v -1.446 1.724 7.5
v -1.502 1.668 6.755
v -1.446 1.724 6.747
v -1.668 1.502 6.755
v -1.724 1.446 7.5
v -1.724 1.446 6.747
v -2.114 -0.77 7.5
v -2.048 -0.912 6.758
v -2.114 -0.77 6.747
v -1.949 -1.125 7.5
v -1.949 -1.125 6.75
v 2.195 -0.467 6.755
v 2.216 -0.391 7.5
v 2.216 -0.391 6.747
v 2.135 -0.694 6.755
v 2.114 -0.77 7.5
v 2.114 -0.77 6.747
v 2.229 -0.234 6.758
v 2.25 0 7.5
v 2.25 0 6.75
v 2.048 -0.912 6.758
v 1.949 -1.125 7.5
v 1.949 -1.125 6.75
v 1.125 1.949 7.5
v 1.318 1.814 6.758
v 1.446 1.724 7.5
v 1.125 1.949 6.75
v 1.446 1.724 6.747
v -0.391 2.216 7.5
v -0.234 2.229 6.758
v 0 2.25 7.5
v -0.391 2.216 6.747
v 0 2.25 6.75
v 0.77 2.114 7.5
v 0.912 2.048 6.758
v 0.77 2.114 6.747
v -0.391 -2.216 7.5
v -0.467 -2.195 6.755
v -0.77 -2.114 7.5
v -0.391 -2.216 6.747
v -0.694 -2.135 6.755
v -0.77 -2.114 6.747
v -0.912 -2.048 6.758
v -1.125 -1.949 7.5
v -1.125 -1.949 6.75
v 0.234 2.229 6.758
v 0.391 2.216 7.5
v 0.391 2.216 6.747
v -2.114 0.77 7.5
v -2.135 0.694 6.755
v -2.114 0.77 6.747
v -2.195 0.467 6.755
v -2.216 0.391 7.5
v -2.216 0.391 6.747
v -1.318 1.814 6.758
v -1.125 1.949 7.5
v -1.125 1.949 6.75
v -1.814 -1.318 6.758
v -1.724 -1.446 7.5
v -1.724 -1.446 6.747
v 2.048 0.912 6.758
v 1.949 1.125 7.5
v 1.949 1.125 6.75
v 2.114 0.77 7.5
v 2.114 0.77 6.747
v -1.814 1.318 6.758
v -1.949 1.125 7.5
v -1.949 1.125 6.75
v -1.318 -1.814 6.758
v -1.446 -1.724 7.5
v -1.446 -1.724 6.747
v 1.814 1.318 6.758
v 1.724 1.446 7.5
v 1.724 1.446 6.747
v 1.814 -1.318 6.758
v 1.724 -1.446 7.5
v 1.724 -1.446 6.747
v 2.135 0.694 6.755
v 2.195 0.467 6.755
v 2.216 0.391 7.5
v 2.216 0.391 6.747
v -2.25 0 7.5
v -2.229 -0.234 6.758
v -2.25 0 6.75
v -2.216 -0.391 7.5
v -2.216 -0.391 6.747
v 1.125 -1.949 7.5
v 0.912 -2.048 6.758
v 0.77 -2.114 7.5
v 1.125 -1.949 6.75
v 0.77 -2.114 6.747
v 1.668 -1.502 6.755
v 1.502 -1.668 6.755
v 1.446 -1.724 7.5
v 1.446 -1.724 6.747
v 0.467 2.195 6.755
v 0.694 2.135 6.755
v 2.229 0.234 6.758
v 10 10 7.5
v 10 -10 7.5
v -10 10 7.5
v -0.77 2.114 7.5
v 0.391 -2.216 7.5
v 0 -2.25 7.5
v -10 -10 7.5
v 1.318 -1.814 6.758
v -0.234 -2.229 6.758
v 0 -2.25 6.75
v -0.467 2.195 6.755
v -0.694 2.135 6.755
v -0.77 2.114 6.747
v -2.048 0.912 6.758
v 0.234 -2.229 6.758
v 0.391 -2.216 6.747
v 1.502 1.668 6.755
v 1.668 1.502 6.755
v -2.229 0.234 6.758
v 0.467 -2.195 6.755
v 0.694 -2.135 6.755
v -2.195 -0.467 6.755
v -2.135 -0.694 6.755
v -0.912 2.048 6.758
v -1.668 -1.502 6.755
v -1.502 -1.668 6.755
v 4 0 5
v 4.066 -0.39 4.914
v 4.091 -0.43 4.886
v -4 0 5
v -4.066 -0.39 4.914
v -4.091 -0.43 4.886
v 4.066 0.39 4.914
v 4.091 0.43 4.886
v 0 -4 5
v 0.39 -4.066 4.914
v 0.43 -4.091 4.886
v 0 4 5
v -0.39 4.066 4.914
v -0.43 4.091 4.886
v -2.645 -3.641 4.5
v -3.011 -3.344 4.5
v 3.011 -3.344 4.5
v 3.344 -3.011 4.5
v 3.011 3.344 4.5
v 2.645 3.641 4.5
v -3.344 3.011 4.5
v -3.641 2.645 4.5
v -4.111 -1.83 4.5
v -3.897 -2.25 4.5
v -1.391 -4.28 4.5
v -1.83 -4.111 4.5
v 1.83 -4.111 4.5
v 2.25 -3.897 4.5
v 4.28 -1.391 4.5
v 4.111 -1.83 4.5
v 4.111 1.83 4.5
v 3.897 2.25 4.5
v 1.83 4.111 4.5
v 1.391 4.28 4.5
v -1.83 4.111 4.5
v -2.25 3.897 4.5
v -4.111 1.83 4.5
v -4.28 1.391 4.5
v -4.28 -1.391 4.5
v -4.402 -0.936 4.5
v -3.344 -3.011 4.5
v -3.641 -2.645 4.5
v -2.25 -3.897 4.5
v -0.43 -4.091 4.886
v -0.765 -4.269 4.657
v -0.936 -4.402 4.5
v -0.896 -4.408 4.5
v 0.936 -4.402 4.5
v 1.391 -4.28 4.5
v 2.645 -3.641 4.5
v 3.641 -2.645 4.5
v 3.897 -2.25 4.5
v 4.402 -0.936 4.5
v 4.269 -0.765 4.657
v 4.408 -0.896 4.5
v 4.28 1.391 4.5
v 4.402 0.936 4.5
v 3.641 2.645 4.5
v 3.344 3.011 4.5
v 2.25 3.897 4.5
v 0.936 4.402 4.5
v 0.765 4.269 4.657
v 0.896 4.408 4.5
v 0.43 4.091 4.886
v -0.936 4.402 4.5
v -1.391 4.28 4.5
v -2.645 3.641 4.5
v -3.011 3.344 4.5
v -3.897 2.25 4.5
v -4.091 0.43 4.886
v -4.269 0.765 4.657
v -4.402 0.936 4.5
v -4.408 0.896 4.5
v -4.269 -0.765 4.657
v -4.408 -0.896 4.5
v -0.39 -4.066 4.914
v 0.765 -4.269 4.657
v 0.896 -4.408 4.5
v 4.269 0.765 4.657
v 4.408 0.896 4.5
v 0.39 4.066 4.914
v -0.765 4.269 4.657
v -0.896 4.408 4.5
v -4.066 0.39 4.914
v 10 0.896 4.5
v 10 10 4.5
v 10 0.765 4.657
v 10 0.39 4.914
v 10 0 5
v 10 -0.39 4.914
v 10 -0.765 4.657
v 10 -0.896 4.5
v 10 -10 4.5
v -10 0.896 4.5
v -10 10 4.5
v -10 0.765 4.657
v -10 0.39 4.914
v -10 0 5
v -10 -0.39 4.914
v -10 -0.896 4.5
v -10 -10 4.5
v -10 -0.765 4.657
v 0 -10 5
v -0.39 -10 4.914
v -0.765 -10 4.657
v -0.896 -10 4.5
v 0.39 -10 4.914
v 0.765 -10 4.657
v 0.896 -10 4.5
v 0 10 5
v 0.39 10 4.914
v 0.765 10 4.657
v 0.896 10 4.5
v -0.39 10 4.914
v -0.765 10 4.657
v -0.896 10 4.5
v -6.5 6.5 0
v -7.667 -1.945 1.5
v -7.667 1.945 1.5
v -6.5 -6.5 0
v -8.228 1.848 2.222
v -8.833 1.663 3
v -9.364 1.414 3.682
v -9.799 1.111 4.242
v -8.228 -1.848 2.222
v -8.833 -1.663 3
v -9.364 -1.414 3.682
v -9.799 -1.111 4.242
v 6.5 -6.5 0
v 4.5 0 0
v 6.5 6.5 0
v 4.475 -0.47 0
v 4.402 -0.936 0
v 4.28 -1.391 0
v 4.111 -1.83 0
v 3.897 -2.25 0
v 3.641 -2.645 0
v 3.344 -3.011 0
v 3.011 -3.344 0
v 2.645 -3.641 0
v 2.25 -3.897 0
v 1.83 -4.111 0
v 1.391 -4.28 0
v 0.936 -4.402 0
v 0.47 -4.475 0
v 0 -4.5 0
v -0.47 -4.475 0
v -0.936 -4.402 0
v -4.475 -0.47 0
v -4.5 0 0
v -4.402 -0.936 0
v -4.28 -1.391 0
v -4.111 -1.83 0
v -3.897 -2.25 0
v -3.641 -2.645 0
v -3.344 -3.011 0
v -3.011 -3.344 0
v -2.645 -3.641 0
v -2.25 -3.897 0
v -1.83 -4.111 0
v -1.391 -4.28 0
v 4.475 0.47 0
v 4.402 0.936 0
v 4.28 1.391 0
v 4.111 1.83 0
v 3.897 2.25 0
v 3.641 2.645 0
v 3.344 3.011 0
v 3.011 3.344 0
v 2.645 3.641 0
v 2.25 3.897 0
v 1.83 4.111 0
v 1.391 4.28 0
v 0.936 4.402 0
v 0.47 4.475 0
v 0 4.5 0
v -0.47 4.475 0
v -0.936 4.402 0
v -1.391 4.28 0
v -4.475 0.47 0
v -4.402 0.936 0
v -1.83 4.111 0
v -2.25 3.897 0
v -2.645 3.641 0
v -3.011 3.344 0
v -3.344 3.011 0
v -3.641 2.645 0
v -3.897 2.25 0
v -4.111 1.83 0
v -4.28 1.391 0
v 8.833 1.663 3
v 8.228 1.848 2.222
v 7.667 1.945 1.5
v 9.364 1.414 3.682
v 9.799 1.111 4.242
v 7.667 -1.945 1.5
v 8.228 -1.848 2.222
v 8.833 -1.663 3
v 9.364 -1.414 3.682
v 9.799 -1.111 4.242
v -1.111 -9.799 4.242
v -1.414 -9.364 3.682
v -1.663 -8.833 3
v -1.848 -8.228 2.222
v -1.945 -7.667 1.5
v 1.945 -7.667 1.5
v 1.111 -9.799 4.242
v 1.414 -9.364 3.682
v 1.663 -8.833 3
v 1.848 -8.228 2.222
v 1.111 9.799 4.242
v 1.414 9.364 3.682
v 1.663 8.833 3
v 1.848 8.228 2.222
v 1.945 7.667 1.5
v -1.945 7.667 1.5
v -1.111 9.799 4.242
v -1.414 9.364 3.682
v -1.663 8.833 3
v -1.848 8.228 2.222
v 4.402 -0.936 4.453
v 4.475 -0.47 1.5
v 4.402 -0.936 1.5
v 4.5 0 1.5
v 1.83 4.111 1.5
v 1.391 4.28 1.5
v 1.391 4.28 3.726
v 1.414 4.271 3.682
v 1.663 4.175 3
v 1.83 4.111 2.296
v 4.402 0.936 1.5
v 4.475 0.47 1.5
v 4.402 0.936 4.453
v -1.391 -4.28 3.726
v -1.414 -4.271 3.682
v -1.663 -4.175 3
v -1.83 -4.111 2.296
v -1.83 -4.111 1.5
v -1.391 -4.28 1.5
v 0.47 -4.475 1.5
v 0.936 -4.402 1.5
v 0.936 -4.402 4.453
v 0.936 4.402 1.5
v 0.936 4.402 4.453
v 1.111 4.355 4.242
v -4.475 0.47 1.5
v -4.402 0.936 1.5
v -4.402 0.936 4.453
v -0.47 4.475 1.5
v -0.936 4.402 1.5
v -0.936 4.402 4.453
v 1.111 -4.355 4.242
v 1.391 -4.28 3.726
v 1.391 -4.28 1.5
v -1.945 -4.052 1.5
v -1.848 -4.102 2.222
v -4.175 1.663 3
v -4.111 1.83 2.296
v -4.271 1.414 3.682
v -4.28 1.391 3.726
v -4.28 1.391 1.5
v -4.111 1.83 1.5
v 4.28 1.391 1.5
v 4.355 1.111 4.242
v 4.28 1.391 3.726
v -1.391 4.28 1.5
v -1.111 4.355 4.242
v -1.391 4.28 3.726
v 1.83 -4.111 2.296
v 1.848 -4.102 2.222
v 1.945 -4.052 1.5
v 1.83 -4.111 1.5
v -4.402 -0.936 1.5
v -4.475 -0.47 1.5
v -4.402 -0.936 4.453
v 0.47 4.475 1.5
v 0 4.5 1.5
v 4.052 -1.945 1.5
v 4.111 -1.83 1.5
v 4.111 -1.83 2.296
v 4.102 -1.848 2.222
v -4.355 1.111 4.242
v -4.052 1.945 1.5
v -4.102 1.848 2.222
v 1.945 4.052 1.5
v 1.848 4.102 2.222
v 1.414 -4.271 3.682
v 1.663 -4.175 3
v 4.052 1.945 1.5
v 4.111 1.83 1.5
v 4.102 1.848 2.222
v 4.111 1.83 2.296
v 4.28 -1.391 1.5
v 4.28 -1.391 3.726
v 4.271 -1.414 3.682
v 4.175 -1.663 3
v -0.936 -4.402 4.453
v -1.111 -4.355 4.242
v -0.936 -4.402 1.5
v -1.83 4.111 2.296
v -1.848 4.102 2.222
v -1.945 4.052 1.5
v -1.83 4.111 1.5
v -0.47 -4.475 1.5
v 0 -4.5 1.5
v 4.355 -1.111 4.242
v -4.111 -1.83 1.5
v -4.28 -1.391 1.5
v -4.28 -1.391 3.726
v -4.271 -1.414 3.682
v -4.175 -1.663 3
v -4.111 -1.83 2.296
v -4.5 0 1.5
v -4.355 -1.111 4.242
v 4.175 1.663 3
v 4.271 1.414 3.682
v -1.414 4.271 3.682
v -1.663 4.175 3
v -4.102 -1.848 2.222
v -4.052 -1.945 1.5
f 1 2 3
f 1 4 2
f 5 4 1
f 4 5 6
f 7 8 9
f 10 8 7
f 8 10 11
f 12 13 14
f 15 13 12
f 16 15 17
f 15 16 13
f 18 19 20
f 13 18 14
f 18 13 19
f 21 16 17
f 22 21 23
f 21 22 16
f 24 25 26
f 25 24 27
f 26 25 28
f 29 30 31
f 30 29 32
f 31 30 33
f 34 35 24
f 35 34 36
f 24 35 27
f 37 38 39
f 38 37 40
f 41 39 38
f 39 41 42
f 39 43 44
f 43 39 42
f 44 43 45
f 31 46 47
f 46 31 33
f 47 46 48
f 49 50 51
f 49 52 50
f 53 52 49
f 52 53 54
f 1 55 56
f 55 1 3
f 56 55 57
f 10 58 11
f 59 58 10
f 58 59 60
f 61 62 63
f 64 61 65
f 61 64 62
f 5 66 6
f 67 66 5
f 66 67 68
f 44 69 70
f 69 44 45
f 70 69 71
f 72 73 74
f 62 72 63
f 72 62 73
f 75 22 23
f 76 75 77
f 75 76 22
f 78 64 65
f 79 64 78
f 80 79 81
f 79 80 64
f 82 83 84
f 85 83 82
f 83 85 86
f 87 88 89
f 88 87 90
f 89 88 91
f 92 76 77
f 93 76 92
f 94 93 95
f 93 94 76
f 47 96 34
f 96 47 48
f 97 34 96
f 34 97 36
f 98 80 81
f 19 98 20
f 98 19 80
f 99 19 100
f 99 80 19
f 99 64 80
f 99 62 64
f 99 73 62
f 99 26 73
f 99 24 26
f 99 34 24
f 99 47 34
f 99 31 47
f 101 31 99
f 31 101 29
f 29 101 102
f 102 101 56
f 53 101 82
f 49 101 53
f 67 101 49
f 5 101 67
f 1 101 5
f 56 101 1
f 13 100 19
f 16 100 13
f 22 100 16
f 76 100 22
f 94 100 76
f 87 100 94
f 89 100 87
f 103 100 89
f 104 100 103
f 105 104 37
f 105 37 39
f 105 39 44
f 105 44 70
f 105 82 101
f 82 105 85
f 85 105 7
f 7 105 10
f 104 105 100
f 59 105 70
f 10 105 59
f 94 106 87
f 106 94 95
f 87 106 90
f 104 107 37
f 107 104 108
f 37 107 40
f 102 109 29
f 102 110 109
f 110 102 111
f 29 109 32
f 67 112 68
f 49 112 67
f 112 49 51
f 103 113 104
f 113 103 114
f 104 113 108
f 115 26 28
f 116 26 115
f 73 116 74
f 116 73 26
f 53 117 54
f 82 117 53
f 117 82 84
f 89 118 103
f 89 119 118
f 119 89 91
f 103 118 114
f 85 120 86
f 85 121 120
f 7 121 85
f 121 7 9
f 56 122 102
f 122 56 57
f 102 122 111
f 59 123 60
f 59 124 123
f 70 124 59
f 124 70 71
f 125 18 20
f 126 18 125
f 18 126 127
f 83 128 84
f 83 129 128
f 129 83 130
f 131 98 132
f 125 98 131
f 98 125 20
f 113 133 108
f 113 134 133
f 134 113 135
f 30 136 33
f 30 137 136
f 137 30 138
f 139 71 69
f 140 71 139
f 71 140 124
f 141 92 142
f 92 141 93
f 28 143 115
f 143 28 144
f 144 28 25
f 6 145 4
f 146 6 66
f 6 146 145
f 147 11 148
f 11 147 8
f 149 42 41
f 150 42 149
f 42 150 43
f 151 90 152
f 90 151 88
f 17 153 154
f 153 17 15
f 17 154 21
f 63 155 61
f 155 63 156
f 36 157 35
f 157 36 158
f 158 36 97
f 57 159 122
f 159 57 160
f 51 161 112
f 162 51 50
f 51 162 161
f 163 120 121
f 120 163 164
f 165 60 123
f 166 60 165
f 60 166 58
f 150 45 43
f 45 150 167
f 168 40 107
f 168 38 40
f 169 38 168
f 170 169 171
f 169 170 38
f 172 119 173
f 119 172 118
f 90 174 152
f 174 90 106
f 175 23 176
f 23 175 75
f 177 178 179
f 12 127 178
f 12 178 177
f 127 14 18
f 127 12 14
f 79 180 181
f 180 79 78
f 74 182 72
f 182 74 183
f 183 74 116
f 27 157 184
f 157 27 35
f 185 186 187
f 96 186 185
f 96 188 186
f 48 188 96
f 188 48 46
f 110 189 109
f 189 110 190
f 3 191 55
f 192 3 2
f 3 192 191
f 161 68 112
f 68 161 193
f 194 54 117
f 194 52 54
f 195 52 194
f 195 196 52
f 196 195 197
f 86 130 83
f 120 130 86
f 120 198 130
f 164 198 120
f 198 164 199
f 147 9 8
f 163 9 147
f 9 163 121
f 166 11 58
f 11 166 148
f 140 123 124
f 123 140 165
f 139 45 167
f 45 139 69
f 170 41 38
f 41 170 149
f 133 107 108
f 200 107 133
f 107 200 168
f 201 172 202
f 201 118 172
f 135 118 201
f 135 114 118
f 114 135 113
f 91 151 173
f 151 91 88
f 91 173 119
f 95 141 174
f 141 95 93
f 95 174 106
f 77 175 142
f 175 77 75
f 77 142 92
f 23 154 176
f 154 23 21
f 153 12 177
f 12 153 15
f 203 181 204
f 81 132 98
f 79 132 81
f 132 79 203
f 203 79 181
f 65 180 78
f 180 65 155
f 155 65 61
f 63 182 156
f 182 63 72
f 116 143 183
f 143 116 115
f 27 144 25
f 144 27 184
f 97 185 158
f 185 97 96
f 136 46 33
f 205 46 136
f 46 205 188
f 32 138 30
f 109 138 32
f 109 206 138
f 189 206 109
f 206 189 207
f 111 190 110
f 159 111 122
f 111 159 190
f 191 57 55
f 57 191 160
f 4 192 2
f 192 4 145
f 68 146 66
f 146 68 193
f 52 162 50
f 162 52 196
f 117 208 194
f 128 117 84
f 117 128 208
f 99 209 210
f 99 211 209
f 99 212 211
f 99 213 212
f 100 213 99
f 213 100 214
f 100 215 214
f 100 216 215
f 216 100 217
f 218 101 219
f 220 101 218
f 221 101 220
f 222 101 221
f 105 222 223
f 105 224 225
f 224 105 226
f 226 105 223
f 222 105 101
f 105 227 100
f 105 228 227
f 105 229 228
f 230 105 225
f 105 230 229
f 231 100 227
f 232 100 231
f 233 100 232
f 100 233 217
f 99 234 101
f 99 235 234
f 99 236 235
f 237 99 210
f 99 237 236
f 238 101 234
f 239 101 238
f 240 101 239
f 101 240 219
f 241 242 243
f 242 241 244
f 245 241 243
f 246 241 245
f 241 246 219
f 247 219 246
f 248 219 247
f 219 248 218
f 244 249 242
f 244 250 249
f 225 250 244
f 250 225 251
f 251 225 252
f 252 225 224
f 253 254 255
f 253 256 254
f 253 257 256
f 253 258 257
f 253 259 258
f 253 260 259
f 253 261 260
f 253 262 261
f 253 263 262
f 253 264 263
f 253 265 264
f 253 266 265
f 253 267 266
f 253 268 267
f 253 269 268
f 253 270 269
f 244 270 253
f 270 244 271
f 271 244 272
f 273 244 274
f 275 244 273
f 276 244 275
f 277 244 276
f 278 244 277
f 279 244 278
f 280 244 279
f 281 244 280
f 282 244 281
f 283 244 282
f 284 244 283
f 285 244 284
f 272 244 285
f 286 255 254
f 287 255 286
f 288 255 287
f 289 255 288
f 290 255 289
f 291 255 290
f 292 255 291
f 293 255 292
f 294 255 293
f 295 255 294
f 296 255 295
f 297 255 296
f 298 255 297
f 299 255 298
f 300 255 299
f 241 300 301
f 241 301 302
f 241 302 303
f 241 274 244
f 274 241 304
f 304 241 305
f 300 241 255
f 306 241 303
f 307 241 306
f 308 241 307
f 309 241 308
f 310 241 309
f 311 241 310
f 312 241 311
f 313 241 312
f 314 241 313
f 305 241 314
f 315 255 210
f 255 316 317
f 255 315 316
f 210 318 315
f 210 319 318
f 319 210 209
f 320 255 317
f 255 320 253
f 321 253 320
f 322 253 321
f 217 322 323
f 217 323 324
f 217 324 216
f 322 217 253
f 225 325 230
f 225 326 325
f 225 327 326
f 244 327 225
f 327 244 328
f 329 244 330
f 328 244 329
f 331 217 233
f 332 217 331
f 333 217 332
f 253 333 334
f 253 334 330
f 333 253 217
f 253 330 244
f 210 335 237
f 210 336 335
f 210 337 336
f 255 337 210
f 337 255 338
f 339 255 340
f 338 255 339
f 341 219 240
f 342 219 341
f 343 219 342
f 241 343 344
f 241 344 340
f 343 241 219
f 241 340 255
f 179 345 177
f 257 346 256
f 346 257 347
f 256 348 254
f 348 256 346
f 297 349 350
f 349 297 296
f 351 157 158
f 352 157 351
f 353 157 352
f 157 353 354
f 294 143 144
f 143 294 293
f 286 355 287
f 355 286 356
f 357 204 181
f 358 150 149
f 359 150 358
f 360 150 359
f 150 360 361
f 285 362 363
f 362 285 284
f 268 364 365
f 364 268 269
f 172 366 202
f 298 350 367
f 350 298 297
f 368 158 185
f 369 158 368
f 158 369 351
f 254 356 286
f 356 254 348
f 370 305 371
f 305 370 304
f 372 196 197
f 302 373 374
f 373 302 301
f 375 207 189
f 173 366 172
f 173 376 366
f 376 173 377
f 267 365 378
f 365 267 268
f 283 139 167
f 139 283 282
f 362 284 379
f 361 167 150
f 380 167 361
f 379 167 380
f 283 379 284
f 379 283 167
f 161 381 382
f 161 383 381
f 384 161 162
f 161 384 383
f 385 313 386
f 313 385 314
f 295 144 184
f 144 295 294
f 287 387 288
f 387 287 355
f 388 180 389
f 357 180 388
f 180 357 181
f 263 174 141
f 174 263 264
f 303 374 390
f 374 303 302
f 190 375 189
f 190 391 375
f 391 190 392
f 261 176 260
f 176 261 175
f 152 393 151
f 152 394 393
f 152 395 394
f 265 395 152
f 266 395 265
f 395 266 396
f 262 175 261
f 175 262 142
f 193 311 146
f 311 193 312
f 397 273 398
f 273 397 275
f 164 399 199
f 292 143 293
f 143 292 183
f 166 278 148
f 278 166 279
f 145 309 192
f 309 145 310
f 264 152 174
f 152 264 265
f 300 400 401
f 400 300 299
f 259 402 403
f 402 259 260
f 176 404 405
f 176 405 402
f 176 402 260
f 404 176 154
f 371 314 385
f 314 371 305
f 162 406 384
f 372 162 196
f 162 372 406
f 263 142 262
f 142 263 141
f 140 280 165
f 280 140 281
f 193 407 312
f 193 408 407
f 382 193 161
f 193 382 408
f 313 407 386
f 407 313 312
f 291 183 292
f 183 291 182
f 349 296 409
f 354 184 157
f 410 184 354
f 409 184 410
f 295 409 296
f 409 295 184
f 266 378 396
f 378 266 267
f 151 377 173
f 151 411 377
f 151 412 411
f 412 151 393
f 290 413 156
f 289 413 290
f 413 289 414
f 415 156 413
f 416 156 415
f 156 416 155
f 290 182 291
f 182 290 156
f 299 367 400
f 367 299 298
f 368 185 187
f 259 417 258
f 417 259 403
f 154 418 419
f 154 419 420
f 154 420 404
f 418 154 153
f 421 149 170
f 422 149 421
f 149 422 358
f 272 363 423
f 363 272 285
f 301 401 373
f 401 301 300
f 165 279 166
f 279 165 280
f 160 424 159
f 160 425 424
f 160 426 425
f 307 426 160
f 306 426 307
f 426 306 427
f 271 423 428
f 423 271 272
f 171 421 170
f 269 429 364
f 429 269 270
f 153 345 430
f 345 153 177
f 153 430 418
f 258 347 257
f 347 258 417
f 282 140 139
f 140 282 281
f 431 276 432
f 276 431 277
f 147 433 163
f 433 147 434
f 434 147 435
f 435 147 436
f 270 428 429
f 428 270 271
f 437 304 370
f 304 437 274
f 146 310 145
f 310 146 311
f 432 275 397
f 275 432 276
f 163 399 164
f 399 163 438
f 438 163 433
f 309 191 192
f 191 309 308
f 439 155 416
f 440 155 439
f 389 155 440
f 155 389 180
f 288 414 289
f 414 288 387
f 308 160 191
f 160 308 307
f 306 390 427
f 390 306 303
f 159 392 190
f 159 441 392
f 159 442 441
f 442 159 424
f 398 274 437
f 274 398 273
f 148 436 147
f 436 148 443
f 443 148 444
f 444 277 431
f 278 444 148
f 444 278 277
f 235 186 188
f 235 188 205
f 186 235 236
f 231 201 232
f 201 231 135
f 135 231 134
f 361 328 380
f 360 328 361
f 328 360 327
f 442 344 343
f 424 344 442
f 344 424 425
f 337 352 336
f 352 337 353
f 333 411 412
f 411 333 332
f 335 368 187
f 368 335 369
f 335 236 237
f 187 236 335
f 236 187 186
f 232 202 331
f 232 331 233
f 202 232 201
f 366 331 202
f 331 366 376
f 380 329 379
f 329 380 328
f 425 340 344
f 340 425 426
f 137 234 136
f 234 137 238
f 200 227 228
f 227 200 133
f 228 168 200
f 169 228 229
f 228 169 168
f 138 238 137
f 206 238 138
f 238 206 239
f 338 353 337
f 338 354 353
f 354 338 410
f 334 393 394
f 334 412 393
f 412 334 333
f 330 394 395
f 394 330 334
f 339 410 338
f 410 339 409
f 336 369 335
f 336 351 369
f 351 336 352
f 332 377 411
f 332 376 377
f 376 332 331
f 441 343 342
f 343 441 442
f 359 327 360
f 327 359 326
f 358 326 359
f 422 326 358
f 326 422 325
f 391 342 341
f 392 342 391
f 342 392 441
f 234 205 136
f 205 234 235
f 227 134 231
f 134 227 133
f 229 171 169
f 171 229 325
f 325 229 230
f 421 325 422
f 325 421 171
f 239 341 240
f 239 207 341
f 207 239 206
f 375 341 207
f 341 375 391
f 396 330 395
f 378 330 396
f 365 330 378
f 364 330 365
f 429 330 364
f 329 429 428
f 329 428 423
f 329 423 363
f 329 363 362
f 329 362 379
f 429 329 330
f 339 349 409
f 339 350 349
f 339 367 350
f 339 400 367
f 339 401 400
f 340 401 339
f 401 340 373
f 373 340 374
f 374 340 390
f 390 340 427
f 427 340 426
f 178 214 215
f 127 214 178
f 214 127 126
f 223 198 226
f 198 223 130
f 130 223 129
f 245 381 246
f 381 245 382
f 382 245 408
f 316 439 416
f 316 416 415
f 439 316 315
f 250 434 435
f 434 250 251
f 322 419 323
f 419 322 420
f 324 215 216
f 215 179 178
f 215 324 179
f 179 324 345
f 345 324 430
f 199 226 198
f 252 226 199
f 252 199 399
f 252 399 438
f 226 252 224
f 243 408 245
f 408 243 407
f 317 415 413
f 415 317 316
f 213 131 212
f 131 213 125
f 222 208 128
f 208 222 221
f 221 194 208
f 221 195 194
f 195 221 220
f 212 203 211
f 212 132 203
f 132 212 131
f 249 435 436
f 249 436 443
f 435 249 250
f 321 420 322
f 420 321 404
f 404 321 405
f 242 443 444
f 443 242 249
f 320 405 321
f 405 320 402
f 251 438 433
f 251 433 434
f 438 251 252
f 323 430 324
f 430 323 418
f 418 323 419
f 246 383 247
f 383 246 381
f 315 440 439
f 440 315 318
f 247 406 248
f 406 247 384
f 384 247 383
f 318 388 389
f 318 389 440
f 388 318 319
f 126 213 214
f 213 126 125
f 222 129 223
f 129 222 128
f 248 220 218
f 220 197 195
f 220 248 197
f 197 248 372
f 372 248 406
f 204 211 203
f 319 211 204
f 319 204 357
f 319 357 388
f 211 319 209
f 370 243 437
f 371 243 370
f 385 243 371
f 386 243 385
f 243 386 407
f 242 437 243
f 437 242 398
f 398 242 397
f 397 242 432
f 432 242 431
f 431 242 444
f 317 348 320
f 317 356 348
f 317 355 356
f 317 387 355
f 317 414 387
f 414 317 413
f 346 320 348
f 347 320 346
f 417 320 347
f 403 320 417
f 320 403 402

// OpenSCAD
// Dimensions
baseWidth=20;
baseHeight=3;
screwSize=4.5;
topHeight=4.5;
topBorder=2;
topHoleSize=9;

// Calculated
tieHoleSize=4;
topWidth=topHoleSize+2*topBorder;
borderTopVertical=topBorder/2;
totalHeight=baseHeight+topHeight;

// Smoother Curves
$fa=6;
$fs=0.4;

translate([0, 0, totalHeight])
rotate([180, 0, 0])
mount();

module mount(){
    difference(){
        union() {
            base();
            top();
        }
        cableTieHole();
        rotate([0,0,90]) cableTieHole();
    }
}

module base(){
    difference(){
        basePlate();
        screwHole();

    }
}

module basePlate(){
    translate([0,0,baseHeight/2])
    cube([baseWidth, baseWidth, baseHeight], center=true);
}

module screwHole(){
    height=baseHeight;
    union(){
        cylinder(h=height, r=screwSize/2);
        translate([0,0,height-screwSize])
        cylinder(h=screwSize, r2=screwSize, r1=0);
    }
    
}

module top(){
    difference(){
        topPyramid();
        topHole();
    }
}

module topPyramid(){
    translate([0,0,baseHeight])
    linear_extrude(topHeight, scale=topWidth/baseWidth)
    square(size=baseWidth, center=true);
}

module topHole(){
    translate([0,0,baseHeight])
    cylinder(h=topHeight, r=topHoleSize/2);
}

module cableTieHole(){
    difference(){
        cableTieHoleBore();
        cableTieHoleTop();
    }
}

module cableTieHoleBore(){
    tieHoleRadius=tieHoleSize/2;
    translate([0, 0, totalHeight-borderTopVertical/2])
    scale(v=[1, 1, topHeight/tieHoleRadius])
    rotate([90, 0, 0])
    cylinder(h=baseWidth, r=tieHoleRadius, center=true);  
}

module cableTieHoleTop(){
    translate([0,0,totalHeight-borderTopVertical/2])
    cube([baseWidth, baseWidth, topBorder], center=true);
}
